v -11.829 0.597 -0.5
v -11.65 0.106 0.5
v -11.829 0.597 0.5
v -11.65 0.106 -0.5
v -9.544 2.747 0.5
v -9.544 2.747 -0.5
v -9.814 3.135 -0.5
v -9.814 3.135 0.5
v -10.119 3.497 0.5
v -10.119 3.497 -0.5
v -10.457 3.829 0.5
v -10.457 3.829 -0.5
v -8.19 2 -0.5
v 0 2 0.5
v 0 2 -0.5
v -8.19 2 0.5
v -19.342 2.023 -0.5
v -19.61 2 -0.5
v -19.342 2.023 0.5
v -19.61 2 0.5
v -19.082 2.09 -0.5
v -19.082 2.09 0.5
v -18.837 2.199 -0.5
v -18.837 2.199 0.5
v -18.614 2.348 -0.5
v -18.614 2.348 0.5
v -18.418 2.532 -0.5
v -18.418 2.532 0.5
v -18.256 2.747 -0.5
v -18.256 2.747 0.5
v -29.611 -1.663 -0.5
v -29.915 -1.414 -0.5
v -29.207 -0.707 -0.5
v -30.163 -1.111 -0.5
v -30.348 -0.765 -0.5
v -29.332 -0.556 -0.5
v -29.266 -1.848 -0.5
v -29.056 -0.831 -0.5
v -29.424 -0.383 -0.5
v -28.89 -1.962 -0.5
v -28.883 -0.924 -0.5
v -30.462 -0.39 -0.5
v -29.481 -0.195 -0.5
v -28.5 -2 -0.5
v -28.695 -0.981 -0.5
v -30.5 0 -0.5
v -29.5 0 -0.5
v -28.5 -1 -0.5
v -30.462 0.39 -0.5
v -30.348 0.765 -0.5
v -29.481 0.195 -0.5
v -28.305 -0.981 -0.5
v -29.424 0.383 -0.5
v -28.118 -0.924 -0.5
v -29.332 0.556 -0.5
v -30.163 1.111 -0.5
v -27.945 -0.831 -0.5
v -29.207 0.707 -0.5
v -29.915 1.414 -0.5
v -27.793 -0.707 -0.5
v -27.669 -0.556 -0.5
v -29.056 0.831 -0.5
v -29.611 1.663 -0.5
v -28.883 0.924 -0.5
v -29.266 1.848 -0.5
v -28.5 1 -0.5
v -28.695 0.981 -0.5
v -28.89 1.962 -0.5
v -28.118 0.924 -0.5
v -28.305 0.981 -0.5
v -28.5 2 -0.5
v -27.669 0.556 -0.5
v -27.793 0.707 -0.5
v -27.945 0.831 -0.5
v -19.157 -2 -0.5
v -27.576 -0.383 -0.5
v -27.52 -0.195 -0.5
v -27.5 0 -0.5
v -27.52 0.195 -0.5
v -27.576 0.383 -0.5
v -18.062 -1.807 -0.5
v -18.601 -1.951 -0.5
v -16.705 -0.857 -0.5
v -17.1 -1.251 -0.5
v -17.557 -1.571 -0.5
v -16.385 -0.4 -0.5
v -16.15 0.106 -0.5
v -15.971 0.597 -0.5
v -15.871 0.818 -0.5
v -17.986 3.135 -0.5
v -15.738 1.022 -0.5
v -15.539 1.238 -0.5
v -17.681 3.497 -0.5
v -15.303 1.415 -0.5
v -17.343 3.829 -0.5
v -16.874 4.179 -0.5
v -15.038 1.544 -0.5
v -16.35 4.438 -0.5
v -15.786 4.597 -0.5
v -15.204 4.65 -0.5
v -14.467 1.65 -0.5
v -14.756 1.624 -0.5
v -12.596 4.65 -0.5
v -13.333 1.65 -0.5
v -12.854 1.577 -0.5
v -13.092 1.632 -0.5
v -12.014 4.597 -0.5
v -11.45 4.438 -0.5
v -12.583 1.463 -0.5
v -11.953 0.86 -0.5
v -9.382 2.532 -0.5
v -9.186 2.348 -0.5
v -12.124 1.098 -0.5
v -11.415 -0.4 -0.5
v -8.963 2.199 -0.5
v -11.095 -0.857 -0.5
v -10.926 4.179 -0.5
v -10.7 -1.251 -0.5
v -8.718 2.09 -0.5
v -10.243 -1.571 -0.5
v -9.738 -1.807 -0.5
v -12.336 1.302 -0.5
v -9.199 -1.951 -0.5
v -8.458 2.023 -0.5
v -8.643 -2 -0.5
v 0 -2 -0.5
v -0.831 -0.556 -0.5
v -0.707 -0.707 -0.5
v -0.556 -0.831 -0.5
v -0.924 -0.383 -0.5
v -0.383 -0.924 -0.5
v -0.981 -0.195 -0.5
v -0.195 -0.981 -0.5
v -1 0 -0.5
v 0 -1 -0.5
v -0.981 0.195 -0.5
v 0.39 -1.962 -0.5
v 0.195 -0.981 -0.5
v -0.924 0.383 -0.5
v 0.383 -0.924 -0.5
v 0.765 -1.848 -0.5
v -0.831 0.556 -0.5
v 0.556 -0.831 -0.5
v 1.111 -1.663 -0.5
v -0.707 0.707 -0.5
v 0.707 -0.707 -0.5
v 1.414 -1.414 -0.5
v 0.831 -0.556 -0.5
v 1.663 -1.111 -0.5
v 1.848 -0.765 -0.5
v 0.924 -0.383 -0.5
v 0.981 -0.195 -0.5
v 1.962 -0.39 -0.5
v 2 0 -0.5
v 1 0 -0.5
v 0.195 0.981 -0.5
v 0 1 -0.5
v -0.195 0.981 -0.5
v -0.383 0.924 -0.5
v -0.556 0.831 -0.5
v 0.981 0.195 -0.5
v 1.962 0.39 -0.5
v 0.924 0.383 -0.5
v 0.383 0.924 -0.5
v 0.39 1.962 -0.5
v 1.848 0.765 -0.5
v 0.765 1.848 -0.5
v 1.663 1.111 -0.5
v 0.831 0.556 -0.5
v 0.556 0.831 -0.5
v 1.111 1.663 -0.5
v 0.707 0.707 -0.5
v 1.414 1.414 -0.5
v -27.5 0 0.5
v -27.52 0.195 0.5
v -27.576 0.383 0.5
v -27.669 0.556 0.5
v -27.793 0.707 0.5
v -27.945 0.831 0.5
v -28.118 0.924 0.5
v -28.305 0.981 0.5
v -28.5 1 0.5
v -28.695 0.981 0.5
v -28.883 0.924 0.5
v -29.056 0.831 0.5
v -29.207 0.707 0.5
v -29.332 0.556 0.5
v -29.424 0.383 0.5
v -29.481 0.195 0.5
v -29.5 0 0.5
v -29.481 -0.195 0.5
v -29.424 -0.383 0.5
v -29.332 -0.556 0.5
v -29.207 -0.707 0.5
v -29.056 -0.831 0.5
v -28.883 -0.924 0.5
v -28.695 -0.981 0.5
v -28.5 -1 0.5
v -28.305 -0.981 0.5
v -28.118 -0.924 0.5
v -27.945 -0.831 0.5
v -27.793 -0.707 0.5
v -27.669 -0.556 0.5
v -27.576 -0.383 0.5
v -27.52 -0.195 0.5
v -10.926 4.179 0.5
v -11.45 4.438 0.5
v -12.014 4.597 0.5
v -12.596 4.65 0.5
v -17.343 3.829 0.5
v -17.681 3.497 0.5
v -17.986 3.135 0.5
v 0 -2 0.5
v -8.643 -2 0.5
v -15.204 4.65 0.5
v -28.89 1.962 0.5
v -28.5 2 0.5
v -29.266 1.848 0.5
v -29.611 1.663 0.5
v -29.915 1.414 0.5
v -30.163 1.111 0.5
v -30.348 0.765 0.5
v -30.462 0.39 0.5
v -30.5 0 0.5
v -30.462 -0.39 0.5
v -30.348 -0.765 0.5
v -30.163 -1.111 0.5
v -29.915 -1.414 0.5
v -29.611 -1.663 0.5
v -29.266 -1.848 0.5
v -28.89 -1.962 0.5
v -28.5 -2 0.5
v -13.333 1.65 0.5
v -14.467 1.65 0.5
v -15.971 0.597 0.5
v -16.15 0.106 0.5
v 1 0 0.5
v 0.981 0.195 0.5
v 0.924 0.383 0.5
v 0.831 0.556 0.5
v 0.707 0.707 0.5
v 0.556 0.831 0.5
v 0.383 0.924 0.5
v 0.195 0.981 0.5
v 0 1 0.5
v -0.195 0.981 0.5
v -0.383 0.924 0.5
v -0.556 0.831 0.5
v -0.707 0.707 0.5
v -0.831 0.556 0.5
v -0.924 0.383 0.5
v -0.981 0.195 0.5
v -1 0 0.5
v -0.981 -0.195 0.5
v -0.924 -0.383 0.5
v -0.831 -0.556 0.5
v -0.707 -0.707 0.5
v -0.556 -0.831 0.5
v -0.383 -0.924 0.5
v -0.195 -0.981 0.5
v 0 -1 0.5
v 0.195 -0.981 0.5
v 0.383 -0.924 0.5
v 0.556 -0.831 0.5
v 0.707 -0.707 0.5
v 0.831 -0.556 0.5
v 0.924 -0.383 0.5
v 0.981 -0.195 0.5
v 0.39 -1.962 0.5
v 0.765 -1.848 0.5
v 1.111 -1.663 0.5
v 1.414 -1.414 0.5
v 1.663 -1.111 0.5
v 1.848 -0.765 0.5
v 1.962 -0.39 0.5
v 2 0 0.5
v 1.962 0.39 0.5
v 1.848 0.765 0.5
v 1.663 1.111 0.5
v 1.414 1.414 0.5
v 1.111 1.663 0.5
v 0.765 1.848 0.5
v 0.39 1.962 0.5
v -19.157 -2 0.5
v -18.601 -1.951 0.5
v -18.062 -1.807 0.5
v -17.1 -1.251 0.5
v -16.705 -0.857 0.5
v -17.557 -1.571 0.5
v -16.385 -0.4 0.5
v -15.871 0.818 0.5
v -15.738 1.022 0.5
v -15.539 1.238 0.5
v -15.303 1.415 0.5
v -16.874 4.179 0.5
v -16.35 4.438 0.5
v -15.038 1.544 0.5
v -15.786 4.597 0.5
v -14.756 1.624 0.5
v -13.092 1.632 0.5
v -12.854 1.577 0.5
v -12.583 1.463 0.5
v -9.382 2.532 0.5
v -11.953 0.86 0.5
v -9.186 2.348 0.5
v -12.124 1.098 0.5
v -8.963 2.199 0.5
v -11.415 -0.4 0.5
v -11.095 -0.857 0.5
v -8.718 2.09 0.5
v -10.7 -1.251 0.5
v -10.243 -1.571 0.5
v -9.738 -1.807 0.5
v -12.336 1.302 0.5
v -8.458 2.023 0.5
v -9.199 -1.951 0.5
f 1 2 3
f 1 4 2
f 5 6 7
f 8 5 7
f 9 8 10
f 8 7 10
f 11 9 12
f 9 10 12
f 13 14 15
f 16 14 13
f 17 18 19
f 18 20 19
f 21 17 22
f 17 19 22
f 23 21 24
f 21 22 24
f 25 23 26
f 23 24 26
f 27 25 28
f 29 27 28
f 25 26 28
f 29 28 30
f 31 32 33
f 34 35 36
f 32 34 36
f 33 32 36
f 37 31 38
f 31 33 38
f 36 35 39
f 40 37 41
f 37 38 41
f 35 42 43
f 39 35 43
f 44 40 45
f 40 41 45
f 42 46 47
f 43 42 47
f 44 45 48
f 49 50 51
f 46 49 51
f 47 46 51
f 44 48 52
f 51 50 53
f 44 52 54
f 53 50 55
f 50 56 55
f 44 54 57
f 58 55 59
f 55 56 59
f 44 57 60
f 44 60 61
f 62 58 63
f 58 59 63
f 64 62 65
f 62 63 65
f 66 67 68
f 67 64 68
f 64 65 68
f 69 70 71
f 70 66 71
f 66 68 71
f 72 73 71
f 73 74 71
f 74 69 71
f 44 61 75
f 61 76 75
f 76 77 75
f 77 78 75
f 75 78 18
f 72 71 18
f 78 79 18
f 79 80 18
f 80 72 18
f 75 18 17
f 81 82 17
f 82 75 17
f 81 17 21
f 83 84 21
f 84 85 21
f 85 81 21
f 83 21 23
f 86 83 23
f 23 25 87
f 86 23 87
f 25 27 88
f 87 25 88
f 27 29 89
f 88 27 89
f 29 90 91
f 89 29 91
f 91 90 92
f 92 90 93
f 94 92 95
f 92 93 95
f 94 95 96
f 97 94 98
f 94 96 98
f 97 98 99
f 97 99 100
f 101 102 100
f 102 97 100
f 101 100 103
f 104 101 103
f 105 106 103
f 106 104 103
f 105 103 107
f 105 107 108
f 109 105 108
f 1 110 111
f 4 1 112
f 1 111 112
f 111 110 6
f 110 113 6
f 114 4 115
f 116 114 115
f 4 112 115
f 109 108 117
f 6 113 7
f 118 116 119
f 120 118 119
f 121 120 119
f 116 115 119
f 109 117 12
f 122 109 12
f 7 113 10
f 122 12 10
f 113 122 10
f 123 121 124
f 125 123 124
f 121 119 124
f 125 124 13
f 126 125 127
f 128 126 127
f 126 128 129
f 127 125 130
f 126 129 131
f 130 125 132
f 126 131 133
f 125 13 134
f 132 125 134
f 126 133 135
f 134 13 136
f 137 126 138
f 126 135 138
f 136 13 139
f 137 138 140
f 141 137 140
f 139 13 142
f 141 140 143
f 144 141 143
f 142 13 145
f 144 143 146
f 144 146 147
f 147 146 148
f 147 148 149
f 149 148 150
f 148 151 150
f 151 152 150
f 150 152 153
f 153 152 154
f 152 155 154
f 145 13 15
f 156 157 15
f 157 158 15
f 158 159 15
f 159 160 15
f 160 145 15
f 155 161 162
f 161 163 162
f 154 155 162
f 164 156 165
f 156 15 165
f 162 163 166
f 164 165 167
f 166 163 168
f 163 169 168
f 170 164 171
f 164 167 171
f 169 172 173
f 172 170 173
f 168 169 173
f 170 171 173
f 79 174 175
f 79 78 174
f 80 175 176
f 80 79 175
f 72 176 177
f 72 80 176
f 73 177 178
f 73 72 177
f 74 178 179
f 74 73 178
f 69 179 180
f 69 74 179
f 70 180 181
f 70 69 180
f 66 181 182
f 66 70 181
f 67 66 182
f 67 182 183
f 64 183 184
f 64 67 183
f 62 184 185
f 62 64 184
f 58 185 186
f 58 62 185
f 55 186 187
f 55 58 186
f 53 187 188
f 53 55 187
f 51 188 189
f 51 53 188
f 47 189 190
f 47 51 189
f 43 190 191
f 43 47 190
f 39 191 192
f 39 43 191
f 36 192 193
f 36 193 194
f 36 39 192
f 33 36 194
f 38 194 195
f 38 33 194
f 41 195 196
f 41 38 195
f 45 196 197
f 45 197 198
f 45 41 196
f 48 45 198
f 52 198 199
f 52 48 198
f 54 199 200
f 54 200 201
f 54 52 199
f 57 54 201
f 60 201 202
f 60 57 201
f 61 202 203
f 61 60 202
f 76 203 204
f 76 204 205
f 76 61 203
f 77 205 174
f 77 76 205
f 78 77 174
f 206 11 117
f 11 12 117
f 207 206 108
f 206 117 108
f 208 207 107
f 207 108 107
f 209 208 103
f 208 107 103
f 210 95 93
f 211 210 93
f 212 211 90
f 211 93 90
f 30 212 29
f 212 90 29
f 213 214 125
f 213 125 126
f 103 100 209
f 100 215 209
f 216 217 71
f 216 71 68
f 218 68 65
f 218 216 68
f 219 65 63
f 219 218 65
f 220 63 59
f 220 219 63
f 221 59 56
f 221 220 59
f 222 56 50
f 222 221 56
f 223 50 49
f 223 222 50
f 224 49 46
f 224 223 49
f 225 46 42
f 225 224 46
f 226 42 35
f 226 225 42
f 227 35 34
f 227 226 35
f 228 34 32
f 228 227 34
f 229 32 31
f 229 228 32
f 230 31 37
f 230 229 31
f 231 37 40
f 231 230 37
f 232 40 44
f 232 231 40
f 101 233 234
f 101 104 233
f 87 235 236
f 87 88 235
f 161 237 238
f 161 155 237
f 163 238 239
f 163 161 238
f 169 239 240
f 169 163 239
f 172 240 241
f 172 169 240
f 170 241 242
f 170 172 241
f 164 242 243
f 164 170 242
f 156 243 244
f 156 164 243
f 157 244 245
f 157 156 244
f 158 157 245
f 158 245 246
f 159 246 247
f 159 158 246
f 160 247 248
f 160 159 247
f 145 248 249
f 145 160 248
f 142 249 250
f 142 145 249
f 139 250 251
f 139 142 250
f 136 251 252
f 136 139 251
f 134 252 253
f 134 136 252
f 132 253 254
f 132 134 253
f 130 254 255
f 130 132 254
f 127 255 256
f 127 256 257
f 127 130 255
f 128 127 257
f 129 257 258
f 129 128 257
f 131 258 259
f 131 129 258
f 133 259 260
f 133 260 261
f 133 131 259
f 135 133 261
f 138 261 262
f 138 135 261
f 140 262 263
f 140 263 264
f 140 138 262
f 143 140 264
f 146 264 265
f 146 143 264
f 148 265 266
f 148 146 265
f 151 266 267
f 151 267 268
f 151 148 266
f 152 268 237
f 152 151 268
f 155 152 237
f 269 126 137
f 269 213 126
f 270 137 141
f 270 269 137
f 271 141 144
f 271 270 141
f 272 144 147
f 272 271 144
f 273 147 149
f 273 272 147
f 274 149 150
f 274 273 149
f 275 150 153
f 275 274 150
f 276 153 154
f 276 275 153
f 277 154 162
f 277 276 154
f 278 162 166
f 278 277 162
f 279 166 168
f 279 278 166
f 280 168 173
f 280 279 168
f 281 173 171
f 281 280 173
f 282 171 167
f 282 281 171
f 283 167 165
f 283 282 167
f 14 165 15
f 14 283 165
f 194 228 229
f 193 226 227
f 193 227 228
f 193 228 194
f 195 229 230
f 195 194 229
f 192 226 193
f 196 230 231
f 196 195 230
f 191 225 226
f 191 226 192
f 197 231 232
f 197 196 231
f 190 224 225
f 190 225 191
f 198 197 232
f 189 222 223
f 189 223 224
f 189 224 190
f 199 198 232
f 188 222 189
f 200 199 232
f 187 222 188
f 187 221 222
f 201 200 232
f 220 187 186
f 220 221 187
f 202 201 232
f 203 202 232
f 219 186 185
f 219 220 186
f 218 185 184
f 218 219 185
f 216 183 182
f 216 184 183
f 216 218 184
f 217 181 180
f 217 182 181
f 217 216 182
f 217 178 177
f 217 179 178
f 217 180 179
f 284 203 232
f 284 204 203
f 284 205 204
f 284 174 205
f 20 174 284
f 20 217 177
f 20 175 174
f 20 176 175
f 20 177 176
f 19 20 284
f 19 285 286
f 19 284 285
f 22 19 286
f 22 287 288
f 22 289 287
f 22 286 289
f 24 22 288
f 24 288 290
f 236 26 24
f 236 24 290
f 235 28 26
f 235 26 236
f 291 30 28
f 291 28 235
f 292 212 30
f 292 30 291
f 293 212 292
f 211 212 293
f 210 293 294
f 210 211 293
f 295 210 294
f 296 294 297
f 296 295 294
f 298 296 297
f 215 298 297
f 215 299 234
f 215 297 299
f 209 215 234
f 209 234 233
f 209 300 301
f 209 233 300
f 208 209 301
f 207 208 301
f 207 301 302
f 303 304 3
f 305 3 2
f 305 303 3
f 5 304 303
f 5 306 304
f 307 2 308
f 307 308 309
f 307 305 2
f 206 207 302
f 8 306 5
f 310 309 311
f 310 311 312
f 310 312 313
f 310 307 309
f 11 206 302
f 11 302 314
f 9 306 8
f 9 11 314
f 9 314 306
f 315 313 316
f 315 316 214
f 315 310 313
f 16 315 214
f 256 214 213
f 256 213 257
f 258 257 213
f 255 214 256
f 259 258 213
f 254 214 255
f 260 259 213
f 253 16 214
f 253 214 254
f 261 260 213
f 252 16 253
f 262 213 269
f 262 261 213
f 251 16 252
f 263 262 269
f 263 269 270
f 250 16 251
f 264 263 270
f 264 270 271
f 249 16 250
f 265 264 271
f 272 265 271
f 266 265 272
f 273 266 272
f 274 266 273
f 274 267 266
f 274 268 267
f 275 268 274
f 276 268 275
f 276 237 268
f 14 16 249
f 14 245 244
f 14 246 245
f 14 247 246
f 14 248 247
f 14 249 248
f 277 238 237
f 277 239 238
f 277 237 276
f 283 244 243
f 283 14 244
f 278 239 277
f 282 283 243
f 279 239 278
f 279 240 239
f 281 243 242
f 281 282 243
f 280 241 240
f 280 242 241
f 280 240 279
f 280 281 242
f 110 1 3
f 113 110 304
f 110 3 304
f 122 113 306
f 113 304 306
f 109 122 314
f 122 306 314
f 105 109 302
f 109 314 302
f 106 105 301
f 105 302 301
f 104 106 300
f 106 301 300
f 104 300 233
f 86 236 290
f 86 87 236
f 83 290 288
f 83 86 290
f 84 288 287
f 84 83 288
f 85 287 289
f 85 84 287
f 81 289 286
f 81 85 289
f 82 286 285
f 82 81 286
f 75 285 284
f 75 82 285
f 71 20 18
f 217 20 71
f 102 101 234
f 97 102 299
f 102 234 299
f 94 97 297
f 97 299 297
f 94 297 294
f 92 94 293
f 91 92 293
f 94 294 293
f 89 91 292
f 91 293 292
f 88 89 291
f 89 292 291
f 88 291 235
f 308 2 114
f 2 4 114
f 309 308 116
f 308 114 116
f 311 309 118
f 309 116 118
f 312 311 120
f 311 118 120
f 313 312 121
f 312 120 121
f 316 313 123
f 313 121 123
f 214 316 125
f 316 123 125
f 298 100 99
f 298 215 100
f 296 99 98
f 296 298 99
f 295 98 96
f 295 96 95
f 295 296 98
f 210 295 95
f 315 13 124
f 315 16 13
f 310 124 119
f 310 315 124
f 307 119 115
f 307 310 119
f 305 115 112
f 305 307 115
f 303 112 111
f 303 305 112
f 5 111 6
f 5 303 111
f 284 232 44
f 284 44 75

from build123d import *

# Parameters (mm, degrees)
SKETCH_1_R      = 1
EXTRUDE_1_DEPTH = 0.5
EXTRUDE1_START  = -0.5
EXTRUDE1_DEPTH  = 1
EXTRUDE2_DEPTH  = 0.5
FILLET1_R       = 1.6
FILLET2_R       = 3.2


# Read off the part's stored shape, not the designer's step: Extrude1
with BuildPart() as part:
    # Эскиз1 → Бобышка-Вытянуть1 (new, symmetric)
    with BuildSketch(Plane.XY):
        with BuildLine():
            Line((0, 2), (-28.5003, 2))
            ThreePointArc((-28.5003, 2), (-30.5003, 0), (-28.5003, -2))
            Line((-28.5003, -2), (0, -2))
            ThreePointArc((0, -2), (2, 0), (0, 2))
        make_face()
        with Locations((-28.5003, 0)):
            Circle(SKETCH_1_R, mode=Mode.SUBTRACT)
        Circle(SKETCH_1_R, mode=Mode.SUBTRACT)
    extrude(amount=EXTRUDE_1_DEPTH, both=True)

    # Extrude1 outline → Extrude1 (add)
    with BuildSketch(Plane.XY.offset(EXTRUDE1_START)):
        with BuildLine():
            ThreePointArc((-9.154212394, 2), (-13.9, 5.15), (-18.645787606, 2))
            Line((-18.645787606, 2), (-9.154212394, 2))
        make_face()
    extrude(amount=EXTRUDE1_DEPTH)

    # Sketch → Extrude2 (cut, symmetric)
    with BuildSketch(Plane.XY):
        with BuildLine():
            ThreePointArc((-11.879660865, 0.735343308), (-12.140166364, 1.235105491), (-12.521595125, 1.65))
            Line((-12.521595125, 1.65), (-15.278404875, 1.65))
            ThreePointArc((-15.278404875, 1.65), (-15.659833636, 1.235105491), (-15.920339135, 0.735343308))
            Line((-15.920339135, 0.735343308), (-16.915922679, -2))
            Line((-16.915922679, -2), (-10.884077321, -2))
            Line((-10.884077321, -2), (-11.879660865, 0.735343308))
        make_face()
        with BuildLine():
            ThreePointArc((-11.686405638, 4.65), (-13.9, 5.15), (-16.113594362, 4.65))
            Line((-16.113594362, 4.65), (-11.686405638, 4.65))
        make_face()
    extrude(amount=EXTRUDE2_DEPTH, both=True, mode=Mode.SUBTRACT)

    # Fillet1
    fillet1_edges = [part.edges().sort_by_distance(p)[0] for p in [
        (-18.645787606, 2, 0),
        (-9.154212394, 2, 0),
        (-15.278404875, 1.65, 0),
        (-12.521595125, 1.65, 0),
    ]]
    fillet(fillet1_edges, radius=FILLET1_R)

    # Fillet2
    fillet2_edges = [part.edges().sort_by_distance(p)[0] for p in [
        (-10.884077321, -2, 0),
        (-16.915922679, -2, 0),
        (-11.686405638, 4.65, 0),
        (-16.113594362, 4.65, 0),
    ]]
    fillet(fillet2_edges, radius=FILLET2_R)


solid = part.part
